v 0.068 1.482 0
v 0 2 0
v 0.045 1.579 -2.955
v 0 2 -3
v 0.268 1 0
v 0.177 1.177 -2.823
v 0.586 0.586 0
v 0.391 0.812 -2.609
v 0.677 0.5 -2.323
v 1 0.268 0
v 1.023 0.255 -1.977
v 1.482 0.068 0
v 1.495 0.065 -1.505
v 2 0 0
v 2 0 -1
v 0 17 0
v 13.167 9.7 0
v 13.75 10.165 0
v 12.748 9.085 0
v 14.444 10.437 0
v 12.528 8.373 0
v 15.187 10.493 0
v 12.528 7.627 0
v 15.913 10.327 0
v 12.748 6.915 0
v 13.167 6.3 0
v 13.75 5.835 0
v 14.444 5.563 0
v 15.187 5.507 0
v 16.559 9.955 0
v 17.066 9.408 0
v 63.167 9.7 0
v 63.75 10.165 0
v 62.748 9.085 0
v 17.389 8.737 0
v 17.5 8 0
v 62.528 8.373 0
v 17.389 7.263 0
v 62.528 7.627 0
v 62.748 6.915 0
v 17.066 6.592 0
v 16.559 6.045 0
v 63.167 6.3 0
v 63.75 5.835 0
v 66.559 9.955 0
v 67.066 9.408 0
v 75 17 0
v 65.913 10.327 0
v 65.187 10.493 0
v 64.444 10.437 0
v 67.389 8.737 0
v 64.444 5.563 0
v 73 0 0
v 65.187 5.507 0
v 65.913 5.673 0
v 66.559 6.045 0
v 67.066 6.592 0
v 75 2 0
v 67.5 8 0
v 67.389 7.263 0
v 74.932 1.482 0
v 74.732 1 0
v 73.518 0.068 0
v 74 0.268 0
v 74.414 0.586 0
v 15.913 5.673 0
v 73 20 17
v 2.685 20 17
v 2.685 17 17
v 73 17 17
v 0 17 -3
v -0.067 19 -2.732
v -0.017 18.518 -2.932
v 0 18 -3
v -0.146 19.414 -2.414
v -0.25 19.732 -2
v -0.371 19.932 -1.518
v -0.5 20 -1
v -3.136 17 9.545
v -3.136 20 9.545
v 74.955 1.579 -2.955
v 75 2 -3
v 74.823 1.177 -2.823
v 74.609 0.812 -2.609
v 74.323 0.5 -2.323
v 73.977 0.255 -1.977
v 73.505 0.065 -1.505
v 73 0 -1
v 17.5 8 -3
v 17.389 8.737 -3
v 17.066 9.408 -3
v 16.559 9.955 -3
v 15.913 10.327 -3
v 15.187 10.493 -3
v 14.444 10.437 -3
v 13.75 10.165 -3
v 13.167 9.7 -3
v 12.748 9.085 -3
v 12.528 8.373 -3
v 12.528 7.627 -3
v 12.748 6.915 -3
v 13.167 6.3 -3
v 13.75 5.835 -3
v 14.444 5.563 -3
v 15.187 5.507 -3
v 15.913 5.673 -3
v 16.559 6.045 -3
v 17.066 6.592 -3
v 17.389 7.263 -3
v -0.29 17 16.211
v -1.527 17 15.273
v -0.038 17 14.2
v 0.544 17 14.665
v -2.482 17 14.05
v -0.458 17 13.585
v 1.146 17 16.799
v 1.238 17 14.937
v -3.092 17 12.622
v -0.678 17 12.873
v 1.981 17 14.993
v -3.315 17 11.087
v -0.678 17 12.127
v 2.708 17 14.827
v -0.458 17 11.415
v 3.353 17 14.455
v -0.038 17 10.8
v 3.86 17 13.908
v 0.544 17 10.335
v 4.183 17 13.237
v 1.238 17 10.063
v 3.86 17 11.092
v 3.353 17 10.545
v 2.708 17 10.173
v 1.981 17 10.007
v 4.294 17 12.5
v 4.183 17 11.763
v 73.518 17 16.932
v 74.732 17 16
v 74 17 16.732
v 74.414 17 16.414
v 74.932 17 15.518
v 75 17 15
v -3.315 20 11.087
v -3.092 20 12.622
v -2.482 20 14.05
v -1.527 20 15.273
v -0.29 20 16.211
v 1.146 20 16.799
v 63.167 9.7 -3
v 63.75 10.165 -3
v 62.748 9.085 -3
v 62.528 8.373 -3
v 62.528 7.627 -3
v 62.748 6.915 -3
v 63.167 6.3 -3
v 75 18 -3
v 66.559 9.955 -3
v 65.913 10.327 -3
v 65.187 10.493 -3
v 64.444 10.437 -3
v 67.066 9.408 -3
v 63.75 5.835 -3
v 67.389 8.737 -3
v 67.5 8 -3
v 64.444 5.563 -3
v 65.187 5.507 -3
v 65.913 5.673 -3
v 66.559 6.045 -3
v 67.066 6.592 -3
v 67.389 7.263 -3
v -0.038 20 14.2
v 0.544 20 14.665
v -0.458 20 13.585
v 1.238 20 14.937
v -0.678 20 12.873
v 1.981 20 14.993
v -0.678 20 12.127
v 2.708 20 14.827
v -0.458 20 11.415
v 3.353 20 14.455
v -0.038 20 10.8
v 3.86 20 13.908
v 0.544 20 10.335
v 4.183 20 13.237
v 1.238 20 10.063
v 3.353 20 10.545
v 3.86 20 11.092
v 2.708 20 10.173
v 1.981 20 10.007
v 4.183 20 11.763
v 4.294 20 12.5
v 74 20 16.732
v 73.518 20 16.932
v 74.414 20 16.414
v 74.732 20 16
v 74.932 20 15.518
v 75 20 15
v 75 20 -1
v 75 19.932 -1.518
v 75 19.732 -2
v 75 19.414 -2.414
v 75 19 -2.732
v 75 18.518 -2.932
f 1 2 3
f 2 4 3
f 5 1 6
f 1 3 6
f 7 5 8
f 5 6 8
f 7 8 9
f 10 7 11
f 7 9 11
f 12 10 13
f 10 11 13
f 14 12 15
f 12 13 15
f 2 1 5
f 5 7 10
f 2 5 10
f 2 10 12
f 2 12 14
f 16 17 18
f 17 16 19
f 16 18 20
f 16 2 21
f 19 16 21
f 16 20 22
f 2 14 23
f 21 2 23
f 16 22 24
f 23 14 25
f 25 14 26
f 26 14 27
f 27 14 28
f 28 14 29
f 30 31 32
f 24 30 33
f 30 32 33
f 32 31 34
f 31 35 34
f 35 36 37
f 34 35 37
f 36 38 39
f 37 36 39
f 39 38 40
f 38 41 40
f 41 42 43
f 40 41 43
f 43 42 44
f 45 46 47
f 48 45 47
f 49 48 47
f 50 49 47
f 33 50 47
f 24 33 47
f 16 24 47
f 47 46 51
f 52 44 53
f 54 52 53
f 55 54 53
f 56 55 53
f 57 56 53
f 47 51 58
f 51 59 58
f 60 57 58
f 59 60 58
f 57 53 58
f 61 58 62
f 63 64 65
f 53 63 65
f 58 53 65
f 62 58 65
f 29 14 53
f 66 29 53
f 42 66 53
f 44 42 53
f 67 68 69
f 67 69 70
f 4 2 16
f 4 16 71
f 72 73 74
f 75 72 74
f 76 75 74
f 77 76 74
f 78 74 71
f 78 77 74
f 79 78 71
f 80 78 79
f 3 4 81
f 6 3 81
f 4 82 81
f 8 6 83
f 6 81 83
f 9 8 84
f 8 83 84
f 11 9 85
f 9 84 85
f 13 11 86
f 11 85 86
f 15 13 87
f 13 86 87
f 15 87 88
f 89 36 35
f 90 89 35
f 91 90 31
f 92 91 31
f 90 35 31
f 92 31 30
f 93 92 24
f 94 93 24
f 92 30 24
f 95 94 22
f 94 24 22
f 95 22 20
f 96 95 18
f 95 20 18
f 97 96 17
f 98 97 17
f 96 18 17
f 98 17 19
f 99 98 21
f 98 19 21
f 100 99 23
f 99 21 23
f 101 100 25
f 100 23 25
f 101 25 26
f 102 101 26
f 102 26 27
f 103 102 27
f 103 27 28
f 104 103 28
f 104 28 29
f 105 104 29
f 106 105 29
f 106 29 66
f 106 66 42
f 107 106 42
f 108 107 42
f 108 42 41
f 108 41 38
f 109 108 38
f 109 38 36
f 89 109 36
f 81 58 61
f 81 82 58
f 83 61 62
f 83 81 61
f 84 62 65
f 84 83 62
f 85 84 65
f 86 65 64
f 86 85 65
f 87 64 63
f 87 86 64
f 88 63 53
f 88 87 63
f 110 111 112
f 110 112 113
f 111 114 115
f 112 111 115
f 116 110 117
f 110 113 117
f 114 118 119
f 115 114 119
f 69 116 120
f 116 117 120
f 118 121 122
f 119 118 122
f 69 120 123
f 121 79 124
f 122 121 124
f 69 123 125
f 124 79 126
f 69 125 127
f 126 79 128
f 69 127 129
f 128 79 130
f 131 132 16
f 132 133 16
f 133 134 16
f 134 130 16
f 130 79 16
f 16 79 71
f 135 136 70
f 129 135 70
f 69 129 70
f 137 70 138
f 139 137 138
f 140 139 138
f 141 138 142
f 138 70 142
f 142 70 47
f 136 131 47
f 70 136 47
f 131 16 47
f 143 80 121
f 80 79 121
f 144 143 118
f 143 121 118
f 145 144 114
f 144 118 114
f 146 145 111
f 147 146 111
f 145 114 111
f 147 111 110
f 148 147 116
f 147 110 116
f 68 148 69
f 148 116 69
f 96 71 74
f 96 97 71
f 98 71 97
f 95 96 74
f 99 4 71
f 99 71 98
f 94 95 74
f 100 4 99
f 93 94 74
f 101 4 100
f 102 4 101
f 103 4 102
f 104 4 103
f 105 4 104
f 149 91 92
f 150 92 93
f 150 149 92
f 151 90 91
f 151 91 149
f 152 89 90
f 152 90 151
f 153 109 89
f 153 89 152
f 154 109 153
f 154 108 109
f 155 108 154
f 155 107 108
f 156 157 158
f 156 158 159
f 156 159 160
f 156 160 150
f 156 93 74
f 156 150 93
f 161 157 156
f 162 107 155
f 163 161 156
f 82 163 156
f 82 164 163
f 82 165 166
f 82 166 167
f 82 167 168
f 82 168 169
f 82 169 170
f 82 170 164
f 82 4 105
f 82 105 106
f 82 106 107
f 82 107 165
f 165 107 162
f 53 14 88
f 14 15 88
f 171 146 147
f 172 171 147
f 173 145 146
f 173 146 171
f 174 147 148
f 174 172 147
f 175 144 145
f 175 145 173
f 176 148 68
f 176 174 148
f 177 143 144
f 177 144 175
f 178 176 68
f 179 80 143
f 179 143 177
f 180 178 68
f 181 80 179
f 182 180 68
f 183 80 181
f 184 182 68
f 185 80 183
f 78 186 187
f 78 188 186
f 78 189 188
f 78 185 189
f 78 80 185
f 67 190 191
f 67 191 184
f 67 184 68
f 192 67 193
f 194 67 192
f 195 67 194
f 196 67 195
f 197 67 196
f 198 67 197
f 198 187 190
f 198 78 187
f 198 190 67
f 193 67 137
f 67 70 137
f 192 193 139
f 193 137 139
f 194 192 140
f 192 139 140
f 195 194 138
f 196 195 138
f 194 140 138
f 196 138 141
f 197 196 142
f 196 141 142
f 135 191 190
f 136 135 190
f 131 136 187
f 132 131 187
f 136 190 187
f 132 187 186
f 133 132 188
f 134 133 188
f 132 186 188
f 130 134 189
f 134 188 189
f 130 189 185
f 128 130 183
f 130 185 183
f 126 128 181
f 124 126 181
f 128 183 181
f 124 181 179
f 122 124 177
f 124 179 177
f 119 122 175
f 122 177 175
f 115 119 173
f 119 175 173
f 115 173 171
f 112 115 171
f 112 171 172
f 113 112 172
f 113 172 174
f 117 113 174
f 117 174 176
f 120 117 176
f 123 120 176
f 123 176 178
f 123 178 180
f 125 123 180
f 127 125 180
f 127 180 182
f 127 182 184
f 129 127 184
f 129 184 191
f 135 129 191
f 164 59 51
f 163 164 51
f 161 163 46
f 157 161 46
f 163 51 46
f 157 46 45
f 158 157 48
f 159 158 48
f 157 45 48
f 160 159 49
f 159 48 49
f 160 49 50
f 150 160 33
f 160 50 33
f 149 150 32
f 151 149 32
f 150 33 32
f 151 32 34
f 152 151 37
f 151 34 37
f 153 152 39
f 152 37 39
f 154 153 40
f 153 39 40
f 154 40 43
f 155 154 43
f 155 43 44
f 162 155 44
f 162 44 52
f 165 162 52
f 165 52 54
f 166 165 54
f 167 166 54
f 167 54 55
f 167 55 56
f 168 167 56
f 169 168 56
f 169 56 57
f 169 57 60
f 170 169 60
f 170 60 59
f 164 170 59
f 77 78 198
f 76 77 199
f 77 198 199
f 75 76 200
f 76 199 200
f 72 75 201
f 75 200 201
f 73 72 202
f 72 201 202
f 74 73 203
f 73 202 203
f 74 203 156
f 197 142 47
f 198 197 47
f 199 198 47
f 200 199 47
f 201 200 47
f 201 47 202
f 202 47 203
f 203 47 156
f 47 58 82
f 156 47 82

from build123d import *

# Parameters (mm, degrees)
SKETCH1_W           = 75
SKETCH1_H           = 3
BOSS_EXTRUDE1_DEPTH = 20
SKETCH2_W           = 75
SKETCH2_H           = 17
BOSS_EXTRUDE2_DEPTH = 3
FILLET1_R           = 6
FILLET2_R           = 2
SKETCH3_R           = 2.5
CUT_EXTRUDE1_DEPTH  = 21
SKETCH4_R           = 2.5
CUT_EXTRUDE2_DEPTH  = 4


with BuildPart() as part:
    # Sketch1 → Boss-Extrude1 (new body)
    with BuildSketch(Plane(origin=(0, 0, 0), x_dir=(1, 0, 0), z_dir=(0, 1, 0))):
        with Locations((37.5, 1.5)):
            Rectangle(SKETCH1_W, SKETCH1_H)
    extrude(amount=BOSS_EXTRUDE1_DEPTH)

    # Sketch2 → Boss-Extrude2 (add)
    with BuildSketch(Plane(origin=(0, 20, 0), x_dir=(1, 0, 0), z_dir=(0, 1, 0))):
        Polygon((0, 0), (0, 3), (-5, -17), (0, -17), align=None)
        with Locations((37.5, -8.5)):
            Rectangle(SKETCH2_W, SKETCH2_H)
    extrude(amount=-BOSS_EXTRUDE2_DEPTH)

    # Fillet1
    fillet1_edges = [part.edges().sort_by_distance(p)[0] for p in [
        (-5, 18.5, 17),
    ]]
    fillet(fillet1_edges, radius=FILLET1_R)

    # Fillet2
    fillet2_edges = [part.edges().sort_by_distance(p)[0] for p in [
        (37.5, 20, -3),
        (75, 18.5, 17),
        (37.5, 0, -3),
        (75, 0, -1.5),
        (0, 0, -1.5),
    ]]
    fillet(fillet2_edges, radius=FILLET2_R)

    # Sketch3 → Cut-Extrude1 (cut, through all)
    with BuildSketch(Plane(origin=(0, 20, 0), x_dir=(1, 0, 0), z_dir=(0, 1, 0))):
        with Locations((1.794270235, -12.5)):
            Circle(SKETCH3_R)
    extrude(amount=-CUT_EXTRUDE1_DEPTH, mode=Mode.SUBTRACT)

    # Sketch4 → Cut-Extrude2 (cut, through all)
    with BuildSketch(Plane.XY):
        with Locations((65, 8)):
            Circle(SKETCH4_R)
        with Locations((15, 8)):
            Circle(SKETCH4_R)
    extrude(amount=-CUT_EXTRUDE2_DEPTH, mode=Mode.SUBTRACT)


solid = part.part
